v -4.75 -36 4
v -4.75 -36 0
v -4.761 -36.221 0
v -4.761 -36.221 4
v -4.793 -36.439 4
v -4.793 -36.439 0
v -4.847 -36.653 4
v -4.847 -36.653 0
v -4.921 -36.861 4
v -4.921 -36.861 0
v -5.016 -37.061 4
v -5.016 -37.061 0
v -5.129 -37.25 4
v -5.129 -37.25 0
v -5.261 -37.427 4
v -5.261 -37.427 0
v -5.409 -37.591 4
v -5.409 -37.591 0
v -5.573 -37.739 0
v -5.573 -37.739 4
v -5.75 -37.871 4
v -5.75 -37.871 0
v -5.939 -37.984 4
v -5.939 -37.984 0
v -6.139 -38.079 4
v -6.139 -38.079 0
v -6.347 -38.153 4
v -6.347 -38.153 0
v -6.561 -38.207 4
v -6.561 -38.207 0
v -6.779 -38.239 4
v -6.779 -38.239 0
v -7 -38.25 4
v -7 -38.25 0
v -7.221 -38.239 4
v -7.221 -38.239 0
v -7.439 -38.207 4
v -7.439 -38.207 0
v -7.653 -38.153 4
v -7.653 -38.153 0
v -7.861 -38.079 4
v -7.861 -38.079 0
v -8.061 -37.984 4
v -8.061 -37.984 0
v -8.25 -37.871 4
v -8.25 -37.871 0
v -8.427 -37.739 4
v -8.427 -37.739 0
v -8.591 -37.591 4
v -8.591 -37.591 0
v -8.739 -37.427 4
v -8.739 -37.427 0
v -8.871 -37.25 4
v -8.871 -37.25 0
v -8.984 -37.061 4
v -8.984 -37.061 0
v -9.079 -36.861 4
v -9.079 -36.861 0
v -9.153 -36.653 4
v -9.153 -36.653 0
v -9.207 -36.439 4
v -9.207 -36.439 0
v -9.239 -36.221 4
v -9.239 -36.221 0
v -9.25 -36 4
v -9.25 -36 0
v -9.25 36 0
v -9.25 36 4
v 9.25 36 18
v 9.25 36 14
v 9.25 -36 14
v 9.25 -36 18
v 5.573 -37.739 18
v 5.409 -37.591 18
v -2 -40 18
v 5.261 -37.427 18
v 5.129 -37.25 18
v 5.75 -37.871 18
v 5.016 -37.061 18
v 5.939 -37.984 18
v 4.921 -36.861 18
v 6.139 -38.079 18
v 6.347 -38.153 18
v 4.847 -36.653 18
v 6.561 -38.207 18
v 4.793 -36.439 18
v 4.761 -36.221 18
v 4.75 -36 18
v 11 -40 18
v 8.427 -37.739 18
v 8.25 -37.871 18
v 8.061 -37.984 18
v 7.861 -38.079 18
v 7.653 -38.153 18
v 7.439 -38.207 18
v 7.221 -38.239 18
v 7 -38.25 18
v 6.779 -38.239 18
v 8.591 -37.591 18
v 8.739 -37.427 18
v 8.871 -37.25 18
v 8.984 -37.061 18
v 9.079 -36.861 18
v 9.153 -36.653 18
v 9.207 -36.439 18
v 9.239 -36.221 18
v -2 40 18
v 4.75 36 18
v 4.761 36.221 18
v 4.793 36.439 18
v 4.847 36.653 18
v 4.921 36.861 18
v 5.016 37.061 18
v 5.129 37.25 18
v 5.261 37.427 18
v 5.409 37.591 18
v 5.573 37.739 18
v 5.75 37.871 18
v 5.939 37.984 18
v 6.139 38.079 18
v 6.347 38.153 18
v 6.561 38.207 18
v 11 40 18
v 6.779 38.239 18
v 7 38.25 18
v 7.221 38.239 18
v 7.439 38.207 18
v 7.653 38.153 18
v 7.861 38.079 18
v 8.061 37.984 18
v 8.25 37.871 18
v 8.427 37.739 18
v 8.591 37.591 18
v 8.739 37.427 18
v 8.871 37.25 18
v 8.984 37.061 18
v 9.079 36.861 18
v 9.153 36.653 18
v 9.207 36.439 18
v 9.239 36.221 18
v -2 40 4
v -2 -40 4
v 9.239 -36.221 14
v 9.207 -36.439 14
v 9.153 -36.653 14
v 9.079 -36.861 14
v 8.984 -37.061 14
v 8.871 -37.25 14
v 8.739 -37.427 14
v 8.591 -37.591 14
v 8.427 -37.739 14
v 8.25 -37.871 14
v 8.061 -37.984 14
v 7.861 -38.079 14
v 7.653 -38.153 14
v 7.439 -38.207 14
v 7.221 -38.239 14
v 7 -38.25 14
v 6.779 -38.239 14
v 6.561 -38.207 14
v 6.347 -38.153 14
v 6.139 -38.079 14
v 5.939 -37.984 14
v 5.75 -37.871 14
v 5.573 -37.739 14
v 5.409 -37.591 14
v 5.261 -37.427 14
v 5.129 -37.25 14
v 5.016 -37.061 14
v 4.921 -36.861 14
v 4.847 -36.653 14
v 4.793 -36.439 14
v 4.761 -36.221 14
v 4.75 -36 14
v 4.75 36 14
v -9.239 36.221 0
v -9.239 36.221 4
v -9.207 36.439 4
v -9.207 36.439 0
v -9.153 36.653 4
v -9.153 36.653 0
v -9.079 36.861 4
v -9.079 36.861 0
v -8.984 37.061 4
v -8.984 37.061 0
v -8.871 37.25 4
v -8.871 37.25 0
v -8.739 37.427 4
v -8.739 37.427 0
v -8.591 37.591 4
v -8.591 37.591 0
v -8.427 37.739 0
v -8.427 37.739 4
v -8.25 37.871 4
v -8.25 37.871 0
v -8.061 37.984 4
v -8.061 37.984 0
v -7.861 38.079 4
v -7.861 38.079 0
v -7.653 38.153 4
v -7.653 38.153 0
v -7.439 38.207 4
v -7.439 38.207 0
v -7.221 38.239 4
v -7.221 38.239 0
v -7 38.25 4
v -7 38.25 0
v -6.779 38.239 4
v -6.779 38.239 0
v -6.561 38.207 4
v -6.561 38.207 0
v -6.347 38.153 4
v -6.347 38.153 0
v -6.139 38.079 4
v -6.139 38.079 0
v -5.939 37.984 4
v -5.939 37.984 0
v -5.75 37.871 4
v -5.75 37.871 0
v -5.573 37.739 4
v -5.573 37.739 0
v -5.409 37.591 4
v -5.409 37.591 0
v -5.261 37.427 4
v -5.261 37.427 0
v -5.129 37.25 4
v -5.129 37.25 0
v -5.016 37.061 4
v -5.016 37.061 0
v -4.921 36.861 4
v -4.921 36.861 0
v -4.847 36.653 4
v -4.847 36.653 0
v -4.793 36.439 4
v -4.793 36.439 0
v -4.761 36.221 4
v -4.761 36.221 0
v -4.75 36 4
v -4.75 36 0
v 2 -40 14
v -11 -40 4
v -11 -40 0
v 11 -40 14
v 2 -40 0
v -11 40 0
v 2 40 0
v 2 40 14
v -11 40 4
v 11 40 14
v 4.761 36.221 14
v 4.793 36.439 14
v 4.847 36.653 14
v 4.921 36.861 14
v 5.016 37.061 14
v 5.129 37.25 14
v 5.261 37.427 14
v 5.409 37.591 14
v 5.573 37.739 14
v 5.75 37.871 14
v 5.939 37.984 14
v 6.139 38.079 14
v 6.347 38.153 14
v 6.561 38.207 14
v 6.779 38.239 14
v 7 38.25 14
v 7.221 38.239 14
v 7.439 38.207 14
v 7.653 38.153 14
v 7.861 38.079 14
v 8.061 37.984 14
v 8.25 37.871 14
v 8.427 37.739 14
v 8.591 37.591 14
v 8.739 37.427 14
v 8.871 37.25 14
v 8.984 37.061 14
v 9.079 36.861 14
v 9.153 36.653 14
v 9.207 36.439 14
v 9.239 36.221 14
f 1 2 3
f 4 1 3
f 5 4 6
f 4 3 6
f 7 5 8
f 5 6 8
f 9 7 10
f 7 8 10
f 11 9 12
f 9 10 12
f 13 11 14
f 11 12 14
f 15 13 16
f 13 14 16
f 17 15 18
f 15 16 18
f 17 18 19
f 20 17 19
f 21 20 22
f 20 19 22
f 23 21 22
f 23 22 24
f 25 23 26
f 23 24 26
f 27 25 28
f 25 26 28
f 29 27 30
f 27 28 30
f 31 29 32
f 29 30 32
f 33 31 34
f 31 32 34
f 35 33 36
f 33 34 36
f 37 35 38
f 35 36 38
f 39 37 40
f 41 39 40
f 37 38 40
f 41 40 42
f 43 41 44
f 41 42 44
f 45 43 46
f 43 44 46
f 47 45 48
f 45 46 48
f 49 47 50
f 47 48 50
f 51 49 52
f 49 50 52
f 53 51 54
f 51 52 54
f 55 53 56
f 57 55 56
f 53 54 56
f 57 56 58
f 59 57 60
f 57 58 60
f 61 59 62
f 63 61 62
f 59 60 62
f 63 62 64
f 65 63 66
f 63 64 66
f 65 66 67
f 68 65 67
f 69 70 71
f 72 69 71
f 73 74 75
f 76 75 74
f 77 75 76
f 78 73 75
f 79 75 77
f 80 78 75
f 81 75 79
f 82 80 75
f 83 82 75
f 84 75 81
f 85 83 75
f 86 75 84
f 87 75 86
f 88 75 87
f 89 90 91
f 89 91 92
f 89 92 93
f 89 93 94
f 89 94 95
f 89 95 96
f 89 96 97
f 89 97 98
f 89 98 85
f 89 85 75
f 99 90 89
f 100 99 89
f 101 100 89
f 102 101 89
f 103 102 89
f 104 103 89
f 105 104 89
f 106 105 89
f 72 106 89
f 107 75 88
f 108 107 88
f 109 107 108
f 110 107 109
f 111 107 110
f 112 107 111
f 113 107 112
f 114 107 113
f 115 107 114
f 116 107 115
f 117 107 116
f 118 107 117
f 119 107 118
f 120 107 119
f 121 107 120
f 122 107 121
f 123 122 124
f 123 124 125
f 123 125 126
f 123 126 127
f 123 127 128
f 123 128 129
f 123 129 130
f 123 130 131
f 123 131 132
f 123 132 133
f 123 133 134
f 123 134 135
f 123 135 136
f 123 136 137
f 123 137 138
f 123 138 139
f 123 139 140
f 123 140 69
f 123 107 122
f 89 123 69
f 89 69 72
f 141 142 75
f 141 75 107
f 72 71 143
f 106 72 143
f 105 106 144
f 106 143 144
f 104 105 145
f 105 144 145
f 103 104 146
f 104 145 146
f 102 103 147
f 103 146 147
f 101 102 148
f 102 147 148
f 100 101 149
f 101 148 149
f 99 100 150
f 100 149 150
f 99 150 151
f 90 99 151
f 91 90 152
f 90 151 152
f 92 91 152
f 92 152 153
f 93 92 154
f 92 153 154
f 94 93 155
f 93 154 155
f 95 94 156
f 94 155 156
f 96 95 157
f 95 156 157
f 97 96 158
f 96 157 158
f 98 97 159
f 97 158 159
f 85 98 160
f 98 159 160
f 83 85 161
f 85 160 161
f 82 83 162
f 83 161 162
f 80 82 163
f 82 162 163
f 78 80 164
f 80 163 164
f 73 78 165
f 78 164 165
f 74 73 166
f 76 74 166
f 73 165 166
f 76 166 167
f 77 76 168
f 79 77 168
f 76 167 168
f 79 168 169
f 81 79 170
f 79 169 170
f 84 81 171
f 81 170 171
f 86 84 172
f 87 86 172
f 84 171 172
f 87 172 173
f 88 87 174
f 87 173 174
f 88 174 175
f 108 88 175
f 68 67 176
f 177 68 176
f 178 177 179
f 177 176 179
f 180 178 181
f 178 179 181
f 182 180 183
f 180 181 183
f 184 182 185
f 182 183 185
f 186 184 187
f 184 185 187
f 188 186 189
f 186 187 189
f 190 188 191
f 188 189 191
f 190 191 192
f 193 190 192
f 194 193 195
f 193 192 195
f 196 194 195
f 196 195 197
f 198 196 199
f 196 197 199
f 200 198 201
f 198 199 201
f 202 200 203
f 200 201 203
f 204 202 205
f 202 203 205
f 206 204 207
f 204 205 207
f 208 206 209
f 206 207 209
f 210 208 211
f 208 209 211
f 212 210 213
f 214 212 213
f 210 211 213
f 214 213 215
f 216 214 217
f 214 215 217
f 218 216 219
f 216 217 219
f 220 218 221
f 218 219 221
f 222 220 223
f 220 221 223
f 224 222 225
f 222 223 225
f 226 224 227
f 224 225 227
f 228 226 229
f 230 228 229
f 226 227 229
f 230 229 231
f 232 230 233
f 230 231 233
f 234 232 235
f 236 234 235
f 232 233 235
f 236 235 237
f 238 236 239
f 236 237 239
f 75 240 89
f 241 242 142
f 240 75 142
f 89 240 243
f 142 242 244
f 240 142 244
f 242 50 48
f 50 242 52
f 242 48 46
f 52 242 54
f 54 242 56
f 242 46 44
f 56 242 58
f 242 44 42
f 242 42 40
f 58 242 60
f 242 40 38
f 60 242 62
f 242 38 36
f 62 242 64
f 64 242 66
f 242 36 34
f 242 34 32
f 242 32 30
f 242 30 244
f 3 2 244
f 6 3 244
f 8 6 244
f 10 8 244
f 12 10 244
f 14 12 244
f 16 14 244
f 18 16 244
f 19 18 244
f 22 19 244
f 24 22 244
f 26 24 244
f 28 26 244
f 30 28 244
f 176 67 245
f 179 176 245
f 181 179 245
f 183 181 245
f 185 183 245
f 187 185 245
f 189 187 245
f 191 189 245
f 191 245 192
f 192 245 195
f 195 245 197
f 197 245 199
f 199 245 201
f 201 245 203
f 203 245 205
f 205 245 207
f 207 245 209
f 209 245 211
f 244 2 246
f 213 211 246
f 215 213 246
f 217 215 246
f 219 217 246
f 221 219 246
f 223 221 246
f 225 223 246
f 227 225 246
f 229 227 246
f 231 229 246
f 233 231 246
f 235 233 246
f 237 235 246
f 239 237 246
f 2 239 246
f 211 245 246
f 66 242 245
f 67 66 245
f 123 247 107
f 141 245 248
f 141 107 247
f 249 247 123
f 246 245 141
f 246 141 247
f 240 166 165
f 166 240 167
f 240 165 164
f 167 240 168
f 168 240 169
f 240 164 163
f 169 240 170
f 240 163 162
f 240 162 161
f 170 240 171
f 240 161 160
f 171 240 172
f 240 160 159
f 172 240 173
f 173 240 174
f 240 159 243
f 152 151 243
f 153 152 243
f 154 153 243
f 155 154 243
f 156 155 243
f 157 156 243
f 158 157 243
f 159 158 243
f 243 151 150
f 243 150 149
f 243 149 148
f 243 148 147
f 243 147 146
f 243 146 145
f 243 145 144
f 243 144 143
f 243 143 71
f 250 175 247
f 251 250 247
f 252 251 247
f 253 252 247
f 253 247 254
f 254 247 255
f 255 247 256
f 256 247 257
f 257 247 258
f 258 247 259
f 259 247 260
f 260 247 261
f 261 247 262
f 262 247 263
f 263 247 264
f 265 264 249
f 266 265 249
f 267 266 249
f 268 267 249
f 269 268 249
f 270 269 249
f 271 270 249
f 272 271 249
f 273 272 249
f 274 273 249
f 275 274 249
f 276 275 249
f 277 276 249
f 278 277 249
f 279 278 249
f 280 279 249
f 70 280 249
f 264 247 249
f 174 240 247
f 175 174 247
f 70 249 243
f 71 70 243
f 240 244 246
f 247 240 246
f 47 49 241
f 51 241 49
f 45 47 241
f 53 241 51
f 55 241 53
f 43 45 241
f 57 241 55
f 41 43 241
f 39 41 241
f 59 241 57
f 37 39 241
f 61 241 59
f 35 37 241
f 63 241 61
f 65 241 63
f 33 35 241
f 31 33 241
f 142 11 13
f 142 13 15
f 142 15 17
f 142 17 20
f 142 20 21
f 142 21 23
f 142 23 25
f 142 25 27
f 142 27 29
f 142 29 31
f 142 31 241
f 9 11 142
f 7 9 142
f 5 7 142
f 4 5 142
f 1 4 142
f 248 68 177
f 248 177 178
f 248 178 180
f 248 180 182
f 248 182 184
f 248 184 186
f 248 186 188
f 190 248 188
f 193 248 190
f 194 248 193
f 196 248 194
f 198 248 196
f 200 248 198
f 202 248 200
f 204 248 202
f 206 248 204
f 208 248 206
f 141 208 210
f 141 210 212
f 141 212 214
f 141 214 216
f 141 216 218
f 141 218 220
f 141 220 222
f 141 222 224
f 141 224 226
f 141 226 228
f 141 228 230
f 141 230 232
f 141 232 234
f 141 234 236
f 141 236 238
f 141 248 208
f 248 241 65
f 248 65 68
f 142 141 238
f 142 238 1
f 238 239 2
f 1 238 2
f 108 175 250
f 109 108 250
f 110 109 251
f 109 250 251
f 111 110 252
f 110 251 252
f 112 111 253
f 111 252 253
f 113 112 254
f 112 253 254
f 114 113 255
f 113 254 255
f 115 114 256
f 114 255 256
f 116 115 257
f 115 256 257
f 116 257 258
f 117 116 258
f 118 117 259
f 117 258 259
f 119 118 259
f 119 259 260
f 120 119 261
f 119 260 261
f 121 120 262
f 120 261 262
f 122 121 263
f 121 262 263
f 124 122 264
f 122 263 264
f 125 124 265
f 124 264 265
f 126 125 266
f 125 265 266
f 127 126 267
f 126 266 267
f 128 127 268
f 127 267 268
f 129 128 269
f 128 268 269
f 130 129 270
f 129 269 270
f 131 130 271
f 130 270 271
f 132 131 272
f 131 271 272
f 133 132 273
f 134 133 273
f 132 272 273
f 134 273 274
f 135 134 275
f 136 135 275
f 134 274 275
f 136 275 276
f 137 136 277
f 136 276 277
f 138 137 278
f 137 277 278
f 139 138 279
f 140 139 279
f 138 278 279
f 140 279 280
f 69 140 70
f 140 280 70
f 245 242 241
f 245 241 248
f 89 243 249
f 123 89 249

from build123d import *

# Parameters (mm, degrees)
F0_W     = 9
F0_H     = 80
F1_DEPTH = 4
F0_W_2   = 4
F2_DEPTH = 18
F3_START = 14
F3_DEPTH = 4


with BuildPart() as f1:
    # F0 (on Top) → F1 (new body)
    with BuildSketch(Plane.XY):
        with Locations((-6.5, 0)):
            Rectangle(F0_W, F0_H)
        with BuildLine():
            ThreePointArc((-9.25, 36), (-7, 38.25), (-4.75, 36))
            Line((-4.75, 36), (-4.75, -36))
            ThreePointArc((-4.75, -36), (-7, -38.25), (-9.25, -36))
            Line((-9.25, -36), (-9.25, 36))
        make_face(mode=Mode.SUBTRACT)
    extrude(amount=F1_DEPTH)

    # F0 (on Top) → F2 (join)
    with BuildSketch(Plane.XY):
        Rectangle(F0_W_2, F0_H)
    extrude(amount=F2_DEPTH)

    # F0 (on Top) → F3 (join)
    with BuildSketch(Plane.XY.offset(F3_START)):
        with Locations((6.5, 0)):
            Rectangle(F0_W, F0_H)
        with BuildLine():
            ThreePointArc((4.75, 36), (7, 38.25), (9.25, 36))
            Line((9.25, 36), (9.25, -36))
            ThreePointArc((9.25, -36), (7, -38.25), (4.75, -36))
            Line((4.75, -36), (4.75, 36))
        make_face(mode=Mode.SUBTRACT)
    extrude(amount=F3_DEPTH)


solid = f1.part
